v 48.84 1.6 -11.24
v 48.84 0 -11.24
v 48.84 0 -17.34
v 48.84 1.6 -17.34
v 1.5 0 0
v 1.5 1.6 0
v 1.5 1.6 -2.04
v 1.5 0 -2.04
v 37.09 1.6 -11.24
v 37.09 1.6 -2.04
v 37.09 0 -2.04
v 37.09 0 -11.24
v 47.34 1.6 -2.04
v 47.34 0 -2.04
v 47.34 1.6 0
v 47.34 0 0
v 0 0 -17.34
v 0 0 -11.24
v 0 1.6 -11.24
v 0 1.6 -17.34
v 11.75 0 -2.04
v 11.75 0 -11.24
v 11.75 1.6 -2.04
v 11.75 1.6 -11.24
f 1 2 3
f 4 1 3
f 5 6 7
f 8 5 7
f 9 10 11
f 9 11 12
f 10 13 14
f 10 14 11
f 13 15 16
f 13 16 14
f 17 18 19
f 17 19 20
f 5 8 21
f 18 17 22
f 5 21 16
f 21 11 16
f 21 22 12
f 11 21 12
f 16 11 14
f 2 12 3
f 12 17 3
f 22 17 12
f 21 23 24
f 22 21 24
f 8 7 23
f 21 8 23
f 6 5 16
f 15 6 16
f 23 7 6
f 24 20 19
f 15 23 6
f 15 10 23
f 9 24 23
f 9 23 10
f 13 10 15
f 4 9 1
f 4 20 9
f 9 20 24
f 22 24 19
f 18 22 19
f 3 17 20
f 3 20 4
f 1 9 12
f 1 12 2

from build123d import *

# Parameters (mm, degrees)
SKETCH1_W         = 48.84
SKETCH1_H         = 17.34
MAIN_SQUARE_DEPTH = 1.6
SKETCH2_W         = 1.5
SKETCH2_H         = 2.04
SERVO_HOLES_DEPTH = 1.6


with BuildPart() as part:
    # Sketch1 → main square (new body)
    with BuildSketch(Plane(origin=(0, 0, 0), x_dir=(1, 0, 0), z_dir=(0, 1, 0))):
        with Locations((24.42, 8.67)):
            Rectangle(SKETCH1_W, SKETCH1_H)
    extrude(amount=MAIN_SQUARE_DEPTH)

    # Sketch2 → servo holes (cut)
    with BuildSketch(Plane(origin=(0, 1.6, 0), x_dir=(1, 0, 0), z_dir=(0, 1, 0))):
        Polygon((11.75, 11.24), (0, 11.24), (0, 2.04), (1.5, 2.04), (11.75, 2.04), align=None)
        with Locations((0.75, 1.02)):
            Rectangle(SKETCH2_W, SKETCH2_H)
    servo_holes = extrude(amount=-SERVO_HOLES_DEPTH, mode=Mode.SUBTRACT)

    # Mirror1: servo holes across plane
    add(servo_holes.mirror(Plane.ZY.offset(-24.42)), mode=Mode.SUBTRACT)


solid = part.part
